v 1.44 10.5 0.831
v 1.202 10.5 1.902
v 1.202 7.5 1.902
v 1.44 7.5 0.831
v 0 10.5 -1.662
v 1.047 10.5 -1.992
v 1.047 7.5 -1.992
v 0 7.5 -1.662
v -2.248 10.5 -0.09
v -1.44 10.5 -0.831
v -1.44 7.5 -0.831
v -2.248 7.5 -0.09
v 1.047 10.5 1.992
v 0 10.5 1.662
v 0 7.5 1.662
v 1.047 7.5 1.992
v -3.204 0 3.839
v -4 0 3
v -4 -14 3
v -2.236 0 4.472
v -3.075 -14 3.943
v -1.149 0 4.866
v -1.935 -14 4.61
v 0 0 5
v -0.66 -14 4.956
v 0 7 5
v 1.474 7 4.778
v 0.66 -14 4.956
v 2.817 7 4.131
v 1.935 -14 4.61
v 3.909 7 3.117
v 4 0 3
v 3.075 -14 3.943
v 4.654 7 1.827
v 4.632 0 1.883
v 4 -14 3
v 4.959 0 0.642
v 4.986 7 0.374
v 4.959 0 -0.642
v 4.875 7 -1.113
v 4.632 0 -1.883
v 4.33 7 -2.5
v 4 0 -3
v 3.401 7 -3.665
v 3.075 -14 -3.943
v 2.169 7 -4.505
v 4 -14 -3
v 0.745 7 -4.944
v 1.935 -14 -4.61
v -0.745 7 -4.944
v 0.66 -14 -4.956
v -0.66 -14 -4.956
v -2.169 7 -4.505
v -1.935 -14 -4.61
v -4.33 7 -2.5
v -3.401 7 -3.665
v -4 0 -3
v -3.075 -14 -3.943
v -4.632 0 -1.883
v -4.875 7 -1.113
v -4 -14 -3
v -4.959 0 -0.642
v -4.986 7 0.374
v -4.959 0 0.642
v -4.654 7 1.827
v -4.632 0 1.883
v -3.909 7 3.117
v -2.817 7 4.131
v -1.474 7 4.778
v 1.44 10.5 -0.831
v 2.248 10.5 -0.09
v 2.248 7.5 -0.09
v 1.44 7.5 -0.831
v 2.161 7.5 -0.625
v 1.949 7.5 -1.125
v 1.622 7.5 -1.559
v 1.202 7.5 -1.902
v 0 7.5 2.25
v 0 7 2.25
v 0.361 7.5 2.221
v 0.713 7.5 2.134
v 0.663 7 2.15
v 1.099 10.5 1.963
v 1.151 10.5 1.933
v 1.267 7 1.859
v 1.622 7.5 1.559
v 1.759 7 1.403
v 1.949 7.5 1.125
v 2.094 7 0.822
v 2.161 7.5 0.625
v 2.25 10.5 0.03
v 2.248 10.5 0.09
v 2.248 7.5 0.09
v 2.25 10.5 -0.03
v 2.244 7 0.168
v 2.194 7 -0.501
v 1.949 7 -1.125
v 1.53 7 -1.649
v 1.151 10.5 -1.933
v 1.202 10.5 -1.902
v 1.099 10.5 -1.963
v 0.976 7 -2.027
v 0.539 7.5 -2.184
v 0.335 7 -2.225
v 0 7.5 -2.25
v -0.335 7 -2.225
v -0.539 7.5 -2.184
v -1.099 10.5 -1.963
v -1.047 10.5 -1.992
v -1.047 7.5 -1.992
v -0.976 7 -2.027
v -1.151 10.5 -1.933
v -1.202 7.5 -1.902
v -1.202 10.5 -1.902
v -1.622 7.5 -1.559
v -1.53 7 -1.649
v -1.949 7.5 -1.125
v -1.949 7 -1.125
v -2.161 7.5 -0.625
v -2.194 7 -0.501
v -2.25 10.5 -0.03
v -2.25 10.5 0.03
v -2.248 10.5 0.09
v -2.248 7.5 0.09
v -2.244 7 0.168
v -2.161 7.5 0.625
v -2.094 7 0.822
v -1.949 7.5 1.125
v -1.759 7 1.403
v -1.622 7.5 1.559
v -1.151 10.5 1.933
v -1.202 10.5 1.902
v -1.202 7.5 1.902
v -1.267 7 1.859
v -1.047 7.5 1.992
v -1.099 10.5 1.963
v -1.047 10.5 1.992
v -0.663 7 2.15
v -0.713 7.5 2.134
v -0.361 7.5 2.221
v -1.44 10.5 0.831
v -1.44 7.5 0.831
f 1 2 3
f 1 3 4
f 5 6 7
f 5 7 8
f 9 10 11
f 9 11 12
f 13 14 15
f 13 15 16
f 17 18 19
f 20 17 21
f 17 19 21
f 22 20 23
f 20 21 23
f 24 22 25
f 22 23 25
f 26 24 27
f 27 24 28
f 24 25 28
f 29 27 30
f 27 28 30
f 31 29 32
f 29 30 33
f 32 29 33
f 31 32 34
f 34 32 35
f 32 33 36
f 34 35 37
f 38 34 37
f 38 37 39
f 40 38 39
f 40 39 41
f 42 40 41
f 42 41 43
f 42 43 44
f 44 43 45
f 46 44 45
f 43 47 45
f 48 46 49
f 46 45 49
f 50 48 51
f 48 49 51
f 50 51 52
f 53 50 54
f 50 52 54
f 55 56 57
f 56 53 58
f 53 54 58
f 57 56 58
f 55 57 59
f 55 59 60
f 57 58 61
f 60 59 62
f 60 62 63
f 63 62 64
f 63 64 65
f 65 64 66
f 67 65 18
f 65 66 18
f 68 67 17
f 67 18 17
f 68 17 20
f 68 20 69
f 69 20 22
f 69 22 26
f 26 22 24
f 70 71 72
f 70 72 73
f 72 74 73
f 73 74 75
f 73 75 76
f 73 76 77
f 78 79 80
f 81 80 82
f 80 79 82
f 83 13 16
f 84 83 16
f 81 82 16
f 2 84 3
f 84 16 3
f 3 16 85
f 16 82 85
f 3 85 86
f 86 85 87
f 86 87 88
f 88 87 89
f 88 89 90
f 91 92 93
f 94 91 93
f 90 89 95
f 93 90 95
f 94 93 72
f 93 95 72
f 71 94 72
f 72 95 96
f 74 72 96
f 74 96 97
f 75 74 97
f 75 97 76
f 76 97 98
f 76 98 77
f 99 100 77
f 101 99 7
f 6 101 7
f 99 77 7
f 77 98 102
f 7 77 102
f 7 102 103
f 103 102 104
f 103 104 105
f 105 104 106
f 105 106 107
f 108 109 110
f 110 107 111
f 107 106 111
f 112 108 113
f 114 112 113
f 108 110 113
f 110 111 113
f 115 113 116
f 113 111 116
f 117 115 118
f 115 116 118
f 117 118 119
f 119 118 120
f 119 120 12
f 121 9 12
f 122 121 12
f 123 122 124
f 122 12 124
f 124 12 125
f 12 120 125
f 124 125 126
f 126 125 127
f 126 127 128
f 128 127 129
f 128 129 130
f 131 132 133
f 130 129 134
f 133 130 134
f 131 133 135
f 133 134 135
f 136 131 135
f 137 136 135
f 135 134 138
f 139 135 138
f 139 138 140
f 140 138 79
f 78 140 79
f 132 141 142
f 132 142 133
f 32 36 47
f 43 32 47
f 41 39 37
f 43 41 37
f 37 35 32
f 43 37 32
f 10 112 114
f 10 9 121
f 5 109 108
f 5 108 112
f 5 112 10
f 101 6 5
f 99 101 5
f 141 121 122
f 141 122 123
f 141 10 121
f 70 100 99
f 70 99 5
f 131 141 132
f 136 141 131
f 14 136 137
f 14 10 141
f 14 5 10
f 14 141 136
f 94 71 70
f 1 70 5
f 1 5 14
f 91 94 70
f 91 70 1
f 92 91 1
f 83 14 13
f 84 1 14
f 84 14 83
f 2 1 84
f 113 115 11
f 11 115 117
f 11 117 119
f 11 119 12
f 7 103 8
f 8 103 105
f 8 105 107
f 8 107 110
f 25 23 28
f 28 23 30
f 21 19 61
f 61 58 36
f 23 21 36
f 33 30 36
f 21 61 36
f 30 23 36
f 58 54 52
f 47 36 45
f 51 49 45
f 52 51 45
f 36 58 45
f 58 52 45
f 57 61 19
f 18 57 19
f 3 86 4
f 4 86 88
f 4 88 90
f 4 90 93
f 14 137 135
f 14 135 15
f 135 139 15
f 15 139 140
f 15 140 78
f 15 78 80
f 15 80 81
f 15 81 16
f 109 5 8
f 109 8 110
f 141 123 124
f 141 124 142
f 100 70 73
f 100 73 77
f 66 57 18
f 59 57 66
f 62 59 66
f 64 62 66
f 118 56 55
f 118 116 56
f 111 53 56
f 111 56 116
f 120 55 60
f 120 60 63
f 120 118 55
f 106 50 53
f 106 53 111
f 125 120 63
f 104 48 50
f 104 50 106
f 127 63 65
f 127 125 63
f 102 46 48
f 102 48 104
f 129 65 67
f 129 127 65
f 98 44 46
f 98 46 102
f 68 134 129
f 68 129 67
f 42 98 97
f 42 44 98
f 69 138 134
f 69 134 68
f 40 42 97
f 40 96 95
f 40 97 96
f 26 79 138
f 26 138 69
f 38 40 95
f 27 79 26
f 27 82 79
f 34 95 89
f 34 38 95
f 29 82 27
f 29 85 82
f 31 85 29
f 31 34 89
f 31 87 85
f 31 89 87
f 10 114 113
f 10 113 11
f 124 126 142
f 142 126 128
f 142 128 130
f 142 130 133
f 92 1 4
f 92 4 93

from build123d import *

# Parameters (mm, degrees)
SKETCH1_R           = 5
BOSS_EXTRUDE1_DEPTH = 7
BOSS_EXTRUDE2_START = -14
BOSS_EXTRUDE2_DEPTH = 14
SKETCH3_R           = 2.25
BOSS_EXTRUDE3_DEPTH = 3.5
CUT_EXTRUDE1_DEPTH  = 3
CIRPATTERN1_COUNT   = 6


with BuildPart() as part:
    # Sketch1 → Boss-Extrude1 (new body)
    with BuildSketch(Plane(origin=(0, 0, 0), x_dir=(1, 0, 0), z_dir=(0, 1, 0))):
        with Locations(Location((0, 0, 0), (0, 0, 270))):
            Circle(SKETCH1_R)
    extrude(amount=BOSS_EXTRUDE1_DEPTH)

    # Sketch2 → Boss-Extrude2 (add)
    with BuildSketch(Plane(origin=(0, 0, 0), x_dir=(1, 0, 0), z_dir=(0, 1, 0)).offset(BOSS_EXTRUDE2_START)):
        with BuildLine():
            Line((4, -3), (4, 3))
            ThreePointArc((4, 3), (0, 5), (-4, 3))
            Line((-4, 3), (-4, -3))
            ThreePointArc((-4, -3), (0, -5), (4, -3))
        make_face()
    extrude(amount=BOSS_EXTRUDE2_DEPTH)

    # Sketch3 → Boss-Extrude3 (add)
    with BuildSketch(Plane(origin=(0, 7, 0), x_dir=(1, 0, 0), z_dir=(0, 1, 0))):
        with Locations(Location((0, 0, 0), (0, 0, 270))):
            Circle(SKETCH3_R)
    extrude(amount=BOSS_EXTRUDE3_DEPTH)

    # Sketch4 → Cut-Extrude1 (cut)
    with BuildSketch(Plane(origin=(0, 10.5, 0), x_dir=(1, 0, 0), z_dir=(0, 1, 0))):
        Polygon((0, 1.662498522), (-5.909749561, 3.521754474), (5.909749561, 3.521754474), align=None)
    cut_extrude1 = extrude(amount=-CUT_EXTRUDE1_DEPTH, mode=Mode.SUBTRACT)

    # CirPattern1: Cut-Extrude1 ×6 about axis
    cirpattern1_axis = Axis((0, 0, 0), (0, 1, 0))
    for i in range(1, CIRPATTERN1_COUNT):
        add(cut_extrude1.rotate(cirpattern1_axis, i * 360 / CIRPATTERN1_COUNT), mode=Mode.SUBTRACT)


solid = part.part
